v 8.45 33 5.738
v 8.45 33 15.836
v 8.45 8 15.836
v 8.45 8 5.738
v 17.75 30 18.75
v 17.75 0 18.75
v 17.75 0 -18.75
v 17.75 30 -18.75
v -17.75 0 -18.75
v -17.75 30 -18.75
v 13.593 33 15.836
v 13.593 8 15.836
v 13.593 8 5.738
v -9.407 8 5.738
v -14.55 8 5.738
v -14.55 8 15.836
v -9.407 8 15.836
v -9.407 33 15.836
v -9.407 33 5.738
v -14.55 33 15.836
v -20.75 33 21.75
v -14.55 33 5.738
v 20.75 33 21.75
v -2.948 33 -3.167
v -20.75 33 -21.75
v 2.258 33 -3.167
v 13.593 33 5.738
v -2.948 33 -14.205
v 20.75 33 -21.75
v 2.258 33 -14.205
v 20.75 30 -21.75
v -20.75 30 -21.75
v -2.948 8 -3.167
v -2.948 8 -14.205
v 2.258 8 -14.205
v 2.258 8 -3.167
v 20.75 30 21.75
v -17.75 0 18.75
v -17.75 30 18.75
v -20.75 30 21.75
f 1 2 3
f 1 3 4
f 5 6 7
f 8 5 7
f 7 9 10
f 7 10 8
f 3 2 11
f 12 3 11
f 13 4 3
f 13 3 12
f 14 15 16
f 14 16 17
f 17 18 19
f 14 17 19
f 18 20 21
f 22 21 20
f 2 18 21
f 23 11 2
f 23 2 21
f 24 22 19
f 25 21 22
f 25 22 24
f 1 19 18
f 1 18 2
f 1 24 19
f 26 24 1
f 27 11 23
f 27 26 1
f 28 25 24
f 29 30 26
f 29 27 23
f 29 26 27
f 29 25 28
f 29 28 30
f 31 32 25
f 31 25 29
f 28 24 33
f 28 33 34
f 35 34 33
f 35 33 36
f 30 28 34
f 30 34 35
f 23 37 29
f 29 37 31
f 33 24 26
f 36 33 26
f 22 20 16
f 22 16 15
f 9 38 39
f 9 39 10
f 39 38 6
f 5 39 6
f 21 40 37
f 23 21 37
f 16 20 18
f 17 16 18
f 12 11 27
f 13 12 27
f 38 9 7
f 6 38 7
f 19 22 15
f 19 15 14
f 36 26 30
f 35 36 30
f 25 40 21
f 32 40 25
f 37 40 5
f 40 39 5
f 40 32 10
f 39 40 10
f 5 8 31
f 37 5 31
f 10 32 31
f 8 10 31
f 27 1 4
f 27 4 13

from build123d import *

# Parameters (mm, degrees)
SKETCH_1_W          = 35.5
SKETCH_1_H          = 37.5
EXTRUDE_1_DEPTH     = 30
SKETCH_2_W          = 41.5
SKETCH_2_H          = 43.5
EXTRUDE_2_DEPTH     = 3
SKETCH_4_W          = 5.142655321
SKETCH_4_H          = 10.097164716
SKETCH_4_W_2        = 5.20537063
SKETCH_4_H_2        = 11.037894348
CUT_EXTRUDE_1_DEPTH = 25


with BuildPart() as part:
    # 草图1 → 凸台-拉伸1 (new body)
    with BuildSketch(Plane(origin=(0, 0, 0), x_dir=(1, 0, 0), z_dir=(0, 1, 0))):
        Rectangle(SKETCH_1_W, SKETCH_1_H)
    extrude(amount=EXTRUDE_1_DEPTH)

    # 草图2 → 凸台-拉伸2 (add)
    with BuildSketch(Plane(origin=(0, 30, 0), x_dir=(1, 0, 0), z_dir=(0, 1, 0))):
        Rectangle(SKETCH_2_W, SKETCH_2_H)
    extrude(amount=EXTRUDE_2_DEPTH)

    # 草图4 → 切除-拉伸1 (cut)
    with BuildSketch(Plane(origin=(0, 33, 0), x_dir=(1, 0, 0), z_dir=(0, 1, 0))):
        with Locations((11.02137602, -10.787033113)):
            Rectangle(SKETCH_4_W, SKETCH_4_H)
        with Locations((-0.344934198, 8.686070268)):
            Rectangle(SKETCH_4_W_2, SKETCH_4_H_2)
        with Locations((-11.97862398, -10.787033113)):
            Rectangle(SKETCH_4_W, SKETCH_4_H)
    extrude(amount=-CUT_EXTRUDE_1_DEPTH, mode=Mode.SUBTRACT)


solid = part.part
